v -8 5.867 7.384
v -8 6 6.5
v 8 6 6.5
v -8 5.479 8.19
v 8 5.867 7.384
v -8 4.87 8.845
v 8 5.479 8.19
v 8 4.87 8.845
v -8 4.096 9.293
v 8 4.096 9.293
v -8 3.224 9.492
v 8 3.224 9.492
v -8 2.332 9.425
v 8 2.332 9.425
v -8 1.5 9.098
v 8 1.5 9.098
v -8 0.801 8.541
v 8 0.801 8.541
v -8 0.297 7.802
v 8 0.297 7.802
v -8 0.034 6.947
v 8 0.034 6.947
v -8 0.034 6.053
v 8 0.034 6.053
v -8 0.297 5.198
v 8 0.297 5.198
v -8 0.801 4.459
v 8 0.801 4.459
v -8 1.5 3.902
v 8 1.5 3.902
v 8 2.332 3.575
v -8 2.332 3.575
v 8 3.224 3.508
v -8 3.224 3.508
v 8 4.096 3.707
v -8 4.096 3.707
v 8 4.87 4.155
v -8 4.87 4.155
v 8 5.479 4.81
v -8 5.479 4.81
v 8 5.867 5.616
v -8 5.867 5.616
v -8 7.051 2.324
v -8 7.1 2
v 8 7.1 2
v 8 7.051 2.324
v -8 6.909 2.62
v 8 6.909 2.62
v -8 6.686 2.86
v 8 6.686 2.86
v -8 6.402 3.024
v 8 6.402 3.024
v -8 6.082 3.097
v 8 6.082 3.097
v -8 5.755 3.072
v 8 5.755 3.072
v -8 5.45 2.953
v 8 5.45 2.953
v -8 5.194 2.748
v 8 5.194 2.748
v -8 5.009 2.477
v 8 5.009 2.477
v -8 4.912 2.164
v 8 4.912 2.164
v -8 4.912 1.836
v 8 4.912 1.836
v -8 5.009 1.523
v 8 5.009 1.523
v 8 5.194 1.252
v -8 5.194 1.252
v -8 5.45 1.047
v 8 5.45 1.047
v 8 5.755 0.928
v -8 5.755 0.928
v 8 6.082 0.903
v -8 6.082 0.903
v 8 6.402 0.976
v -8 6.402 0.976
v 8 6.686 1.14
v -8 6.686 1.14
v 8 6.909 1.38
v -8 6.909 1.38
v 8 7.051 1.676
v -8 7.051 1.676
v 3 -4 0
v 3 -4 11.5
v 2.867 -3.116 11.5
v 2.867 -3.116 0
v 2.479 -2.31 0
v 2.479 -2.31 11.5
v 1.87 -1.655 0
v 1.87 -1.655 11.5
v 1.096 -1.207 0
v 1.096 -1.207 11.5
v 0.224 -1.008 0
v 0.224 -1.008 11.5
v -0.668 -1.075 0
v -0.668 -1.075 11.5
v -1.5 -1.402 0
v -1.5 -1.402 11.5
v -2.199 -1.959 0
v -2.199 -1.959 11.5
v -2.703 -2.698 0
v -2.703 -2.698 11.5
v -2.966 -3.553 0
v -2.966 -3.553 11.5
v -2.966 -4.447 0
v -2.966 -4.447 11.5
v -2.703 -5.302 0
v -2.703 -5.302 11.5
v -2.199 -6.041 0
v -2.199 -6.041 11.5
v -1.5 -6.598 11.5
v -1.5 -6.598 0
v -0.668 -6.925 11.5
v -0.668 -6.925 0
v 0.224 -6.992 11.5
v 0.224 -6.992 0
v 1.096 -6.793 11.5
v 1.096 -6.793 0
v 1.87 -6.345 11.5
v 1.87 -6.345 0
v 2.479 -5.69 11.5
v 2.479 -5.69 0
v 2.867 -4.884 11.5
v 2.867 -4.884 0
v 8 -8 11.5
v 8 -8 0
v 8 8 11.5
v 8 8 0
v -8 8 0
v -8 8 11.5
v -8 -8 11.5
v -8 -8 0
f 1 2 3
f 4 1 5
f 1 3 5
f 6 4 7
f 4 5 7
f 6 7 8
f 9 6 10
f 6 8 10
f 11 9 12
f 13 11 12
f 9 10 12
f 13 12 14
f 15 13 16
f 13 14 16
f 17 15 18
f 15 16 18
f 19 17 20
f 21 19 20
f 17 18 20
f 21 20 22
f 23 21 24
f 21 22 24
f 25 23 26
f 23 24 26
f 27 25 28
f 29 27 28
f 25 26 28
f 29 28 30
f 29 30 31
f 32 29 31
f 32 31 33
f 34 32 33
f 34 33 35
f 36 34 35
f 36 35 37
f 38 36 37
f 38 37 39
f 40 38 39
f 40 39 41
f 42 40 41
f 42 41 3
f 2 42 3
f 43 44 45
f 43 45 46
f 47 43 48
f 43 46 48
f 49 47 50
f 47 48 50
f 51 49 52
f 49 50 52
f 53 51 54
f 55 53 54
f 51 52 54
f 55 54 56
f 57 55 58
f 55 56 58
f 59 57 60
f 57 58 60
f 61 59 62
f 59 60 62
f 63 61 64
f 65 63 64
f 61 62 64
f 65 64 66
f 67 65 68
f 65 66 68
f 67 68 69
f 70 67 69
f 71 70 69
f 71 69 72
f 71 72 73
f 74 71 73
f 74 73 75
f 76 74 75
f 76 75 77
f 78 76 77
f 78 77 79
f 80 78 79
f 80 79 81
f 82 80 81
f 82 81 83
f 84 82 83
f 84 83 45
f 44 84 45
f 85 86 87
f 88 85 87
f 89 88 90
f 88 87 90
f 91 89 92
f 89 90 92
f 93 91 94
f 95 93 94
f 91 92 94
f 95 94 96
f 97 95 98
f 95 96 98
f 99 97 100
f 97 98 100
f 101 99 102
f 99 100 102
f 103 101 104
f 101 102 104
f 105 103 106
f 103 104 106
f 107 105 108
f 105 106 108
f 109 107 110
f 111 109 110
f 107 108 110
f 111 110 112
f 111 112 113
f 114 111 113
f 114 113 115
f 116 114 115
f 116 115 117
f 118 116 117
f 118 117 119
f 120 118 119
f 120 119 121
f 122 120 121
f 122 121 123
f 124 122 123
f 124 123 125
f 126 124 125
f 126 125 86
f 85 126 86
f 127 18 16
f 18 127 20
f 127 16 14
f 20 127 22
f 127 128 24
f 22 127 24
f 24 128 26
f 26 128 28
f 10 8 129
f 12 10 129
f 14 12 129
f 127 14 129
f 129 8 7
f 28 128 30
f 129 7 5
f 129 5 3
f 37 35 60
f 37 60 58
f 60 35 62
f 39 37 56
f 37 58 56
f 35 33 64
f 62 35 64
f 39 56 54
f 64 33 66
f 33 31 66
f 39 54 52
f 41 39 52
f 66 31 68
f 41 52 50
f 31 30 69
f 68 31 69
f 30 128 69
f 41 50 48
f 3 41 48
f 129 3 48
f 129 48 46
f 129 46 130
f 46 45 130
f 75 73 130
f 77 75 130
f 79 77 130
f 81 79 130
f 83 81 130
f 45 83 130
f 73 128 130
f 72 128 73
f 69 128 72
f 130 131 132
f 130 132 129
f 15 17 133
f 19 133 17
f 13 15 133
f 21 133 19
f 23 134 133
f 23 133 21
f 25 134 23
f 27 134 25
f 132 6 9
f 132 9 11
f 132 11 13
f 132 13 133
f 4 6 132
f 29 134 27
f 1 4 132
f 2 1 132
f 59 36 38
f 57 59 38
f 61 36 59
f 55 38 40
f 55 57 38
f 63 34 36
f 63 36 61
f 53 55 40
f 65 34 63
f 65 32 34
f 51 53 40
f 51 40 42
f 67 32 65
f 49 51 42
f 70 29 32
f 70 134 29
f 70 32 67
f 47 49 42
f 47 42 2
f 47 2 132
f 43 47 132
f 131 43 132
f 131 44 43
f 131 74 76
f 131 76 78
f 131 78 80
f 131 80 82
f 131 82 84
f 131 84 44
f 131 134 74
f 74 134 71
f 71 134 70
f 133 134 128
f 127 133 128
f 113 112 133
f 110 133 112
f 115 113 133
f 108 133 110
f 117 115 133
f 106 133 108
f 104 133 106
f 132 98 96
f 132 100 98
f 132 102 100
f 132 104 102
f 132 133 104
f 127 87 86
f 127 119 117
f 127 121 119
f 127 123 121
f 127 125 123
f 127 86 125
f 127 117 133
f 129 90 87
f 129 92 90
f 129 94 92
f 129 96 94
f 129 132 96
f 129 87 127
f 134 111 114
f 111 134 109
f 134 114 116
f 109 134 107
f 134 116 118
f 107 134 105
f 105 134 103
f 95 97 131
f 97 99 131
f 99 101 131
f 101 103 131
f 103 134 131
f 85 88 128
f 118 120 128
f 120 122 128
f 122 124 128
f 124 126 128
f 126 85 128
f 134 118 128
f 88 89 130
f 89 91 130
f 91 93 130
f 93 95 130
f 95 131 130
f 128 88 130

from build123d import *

# Parameters (mm, degrees)
F0_W     = 16
F0_H     = 16
F1_DEPTH = 11.5
F2_R     = 3
F3_DEPTH = 25
F4_R     = 3
F4_R_2   = 1.1
F5_DEPTH = 16.001


with BuildPart() as f1:
    # F0 (on Top) → F1 (new body)
    with BuildSketch(Plane.XY):
        Rectangle(F0_W, F0_H)
    extrude(amount=F1_DEPTH)

    # F2 (on face) → F3 (cut)
    with BuildSketch(Plane.XY.offset(11.5)):
        with Locations((0, -4)):
            Circle(F2_R)
    extrude(amount=-F3_DEPTH, mode=Mode.SUBTRACT)

    # F4 (on face) → F5 (cut, through all)
    with BuildSketch(Plane.YZ.offset(8)):
        with Locations((3, 6.5)):
            Circle(F4_R)
        with Locations((6, 2)):
            Circle(F4_R_2)
    extrude(amount=-F5_DEPTH, mode=Mode.SUBTRACT)


solid = f1.part
